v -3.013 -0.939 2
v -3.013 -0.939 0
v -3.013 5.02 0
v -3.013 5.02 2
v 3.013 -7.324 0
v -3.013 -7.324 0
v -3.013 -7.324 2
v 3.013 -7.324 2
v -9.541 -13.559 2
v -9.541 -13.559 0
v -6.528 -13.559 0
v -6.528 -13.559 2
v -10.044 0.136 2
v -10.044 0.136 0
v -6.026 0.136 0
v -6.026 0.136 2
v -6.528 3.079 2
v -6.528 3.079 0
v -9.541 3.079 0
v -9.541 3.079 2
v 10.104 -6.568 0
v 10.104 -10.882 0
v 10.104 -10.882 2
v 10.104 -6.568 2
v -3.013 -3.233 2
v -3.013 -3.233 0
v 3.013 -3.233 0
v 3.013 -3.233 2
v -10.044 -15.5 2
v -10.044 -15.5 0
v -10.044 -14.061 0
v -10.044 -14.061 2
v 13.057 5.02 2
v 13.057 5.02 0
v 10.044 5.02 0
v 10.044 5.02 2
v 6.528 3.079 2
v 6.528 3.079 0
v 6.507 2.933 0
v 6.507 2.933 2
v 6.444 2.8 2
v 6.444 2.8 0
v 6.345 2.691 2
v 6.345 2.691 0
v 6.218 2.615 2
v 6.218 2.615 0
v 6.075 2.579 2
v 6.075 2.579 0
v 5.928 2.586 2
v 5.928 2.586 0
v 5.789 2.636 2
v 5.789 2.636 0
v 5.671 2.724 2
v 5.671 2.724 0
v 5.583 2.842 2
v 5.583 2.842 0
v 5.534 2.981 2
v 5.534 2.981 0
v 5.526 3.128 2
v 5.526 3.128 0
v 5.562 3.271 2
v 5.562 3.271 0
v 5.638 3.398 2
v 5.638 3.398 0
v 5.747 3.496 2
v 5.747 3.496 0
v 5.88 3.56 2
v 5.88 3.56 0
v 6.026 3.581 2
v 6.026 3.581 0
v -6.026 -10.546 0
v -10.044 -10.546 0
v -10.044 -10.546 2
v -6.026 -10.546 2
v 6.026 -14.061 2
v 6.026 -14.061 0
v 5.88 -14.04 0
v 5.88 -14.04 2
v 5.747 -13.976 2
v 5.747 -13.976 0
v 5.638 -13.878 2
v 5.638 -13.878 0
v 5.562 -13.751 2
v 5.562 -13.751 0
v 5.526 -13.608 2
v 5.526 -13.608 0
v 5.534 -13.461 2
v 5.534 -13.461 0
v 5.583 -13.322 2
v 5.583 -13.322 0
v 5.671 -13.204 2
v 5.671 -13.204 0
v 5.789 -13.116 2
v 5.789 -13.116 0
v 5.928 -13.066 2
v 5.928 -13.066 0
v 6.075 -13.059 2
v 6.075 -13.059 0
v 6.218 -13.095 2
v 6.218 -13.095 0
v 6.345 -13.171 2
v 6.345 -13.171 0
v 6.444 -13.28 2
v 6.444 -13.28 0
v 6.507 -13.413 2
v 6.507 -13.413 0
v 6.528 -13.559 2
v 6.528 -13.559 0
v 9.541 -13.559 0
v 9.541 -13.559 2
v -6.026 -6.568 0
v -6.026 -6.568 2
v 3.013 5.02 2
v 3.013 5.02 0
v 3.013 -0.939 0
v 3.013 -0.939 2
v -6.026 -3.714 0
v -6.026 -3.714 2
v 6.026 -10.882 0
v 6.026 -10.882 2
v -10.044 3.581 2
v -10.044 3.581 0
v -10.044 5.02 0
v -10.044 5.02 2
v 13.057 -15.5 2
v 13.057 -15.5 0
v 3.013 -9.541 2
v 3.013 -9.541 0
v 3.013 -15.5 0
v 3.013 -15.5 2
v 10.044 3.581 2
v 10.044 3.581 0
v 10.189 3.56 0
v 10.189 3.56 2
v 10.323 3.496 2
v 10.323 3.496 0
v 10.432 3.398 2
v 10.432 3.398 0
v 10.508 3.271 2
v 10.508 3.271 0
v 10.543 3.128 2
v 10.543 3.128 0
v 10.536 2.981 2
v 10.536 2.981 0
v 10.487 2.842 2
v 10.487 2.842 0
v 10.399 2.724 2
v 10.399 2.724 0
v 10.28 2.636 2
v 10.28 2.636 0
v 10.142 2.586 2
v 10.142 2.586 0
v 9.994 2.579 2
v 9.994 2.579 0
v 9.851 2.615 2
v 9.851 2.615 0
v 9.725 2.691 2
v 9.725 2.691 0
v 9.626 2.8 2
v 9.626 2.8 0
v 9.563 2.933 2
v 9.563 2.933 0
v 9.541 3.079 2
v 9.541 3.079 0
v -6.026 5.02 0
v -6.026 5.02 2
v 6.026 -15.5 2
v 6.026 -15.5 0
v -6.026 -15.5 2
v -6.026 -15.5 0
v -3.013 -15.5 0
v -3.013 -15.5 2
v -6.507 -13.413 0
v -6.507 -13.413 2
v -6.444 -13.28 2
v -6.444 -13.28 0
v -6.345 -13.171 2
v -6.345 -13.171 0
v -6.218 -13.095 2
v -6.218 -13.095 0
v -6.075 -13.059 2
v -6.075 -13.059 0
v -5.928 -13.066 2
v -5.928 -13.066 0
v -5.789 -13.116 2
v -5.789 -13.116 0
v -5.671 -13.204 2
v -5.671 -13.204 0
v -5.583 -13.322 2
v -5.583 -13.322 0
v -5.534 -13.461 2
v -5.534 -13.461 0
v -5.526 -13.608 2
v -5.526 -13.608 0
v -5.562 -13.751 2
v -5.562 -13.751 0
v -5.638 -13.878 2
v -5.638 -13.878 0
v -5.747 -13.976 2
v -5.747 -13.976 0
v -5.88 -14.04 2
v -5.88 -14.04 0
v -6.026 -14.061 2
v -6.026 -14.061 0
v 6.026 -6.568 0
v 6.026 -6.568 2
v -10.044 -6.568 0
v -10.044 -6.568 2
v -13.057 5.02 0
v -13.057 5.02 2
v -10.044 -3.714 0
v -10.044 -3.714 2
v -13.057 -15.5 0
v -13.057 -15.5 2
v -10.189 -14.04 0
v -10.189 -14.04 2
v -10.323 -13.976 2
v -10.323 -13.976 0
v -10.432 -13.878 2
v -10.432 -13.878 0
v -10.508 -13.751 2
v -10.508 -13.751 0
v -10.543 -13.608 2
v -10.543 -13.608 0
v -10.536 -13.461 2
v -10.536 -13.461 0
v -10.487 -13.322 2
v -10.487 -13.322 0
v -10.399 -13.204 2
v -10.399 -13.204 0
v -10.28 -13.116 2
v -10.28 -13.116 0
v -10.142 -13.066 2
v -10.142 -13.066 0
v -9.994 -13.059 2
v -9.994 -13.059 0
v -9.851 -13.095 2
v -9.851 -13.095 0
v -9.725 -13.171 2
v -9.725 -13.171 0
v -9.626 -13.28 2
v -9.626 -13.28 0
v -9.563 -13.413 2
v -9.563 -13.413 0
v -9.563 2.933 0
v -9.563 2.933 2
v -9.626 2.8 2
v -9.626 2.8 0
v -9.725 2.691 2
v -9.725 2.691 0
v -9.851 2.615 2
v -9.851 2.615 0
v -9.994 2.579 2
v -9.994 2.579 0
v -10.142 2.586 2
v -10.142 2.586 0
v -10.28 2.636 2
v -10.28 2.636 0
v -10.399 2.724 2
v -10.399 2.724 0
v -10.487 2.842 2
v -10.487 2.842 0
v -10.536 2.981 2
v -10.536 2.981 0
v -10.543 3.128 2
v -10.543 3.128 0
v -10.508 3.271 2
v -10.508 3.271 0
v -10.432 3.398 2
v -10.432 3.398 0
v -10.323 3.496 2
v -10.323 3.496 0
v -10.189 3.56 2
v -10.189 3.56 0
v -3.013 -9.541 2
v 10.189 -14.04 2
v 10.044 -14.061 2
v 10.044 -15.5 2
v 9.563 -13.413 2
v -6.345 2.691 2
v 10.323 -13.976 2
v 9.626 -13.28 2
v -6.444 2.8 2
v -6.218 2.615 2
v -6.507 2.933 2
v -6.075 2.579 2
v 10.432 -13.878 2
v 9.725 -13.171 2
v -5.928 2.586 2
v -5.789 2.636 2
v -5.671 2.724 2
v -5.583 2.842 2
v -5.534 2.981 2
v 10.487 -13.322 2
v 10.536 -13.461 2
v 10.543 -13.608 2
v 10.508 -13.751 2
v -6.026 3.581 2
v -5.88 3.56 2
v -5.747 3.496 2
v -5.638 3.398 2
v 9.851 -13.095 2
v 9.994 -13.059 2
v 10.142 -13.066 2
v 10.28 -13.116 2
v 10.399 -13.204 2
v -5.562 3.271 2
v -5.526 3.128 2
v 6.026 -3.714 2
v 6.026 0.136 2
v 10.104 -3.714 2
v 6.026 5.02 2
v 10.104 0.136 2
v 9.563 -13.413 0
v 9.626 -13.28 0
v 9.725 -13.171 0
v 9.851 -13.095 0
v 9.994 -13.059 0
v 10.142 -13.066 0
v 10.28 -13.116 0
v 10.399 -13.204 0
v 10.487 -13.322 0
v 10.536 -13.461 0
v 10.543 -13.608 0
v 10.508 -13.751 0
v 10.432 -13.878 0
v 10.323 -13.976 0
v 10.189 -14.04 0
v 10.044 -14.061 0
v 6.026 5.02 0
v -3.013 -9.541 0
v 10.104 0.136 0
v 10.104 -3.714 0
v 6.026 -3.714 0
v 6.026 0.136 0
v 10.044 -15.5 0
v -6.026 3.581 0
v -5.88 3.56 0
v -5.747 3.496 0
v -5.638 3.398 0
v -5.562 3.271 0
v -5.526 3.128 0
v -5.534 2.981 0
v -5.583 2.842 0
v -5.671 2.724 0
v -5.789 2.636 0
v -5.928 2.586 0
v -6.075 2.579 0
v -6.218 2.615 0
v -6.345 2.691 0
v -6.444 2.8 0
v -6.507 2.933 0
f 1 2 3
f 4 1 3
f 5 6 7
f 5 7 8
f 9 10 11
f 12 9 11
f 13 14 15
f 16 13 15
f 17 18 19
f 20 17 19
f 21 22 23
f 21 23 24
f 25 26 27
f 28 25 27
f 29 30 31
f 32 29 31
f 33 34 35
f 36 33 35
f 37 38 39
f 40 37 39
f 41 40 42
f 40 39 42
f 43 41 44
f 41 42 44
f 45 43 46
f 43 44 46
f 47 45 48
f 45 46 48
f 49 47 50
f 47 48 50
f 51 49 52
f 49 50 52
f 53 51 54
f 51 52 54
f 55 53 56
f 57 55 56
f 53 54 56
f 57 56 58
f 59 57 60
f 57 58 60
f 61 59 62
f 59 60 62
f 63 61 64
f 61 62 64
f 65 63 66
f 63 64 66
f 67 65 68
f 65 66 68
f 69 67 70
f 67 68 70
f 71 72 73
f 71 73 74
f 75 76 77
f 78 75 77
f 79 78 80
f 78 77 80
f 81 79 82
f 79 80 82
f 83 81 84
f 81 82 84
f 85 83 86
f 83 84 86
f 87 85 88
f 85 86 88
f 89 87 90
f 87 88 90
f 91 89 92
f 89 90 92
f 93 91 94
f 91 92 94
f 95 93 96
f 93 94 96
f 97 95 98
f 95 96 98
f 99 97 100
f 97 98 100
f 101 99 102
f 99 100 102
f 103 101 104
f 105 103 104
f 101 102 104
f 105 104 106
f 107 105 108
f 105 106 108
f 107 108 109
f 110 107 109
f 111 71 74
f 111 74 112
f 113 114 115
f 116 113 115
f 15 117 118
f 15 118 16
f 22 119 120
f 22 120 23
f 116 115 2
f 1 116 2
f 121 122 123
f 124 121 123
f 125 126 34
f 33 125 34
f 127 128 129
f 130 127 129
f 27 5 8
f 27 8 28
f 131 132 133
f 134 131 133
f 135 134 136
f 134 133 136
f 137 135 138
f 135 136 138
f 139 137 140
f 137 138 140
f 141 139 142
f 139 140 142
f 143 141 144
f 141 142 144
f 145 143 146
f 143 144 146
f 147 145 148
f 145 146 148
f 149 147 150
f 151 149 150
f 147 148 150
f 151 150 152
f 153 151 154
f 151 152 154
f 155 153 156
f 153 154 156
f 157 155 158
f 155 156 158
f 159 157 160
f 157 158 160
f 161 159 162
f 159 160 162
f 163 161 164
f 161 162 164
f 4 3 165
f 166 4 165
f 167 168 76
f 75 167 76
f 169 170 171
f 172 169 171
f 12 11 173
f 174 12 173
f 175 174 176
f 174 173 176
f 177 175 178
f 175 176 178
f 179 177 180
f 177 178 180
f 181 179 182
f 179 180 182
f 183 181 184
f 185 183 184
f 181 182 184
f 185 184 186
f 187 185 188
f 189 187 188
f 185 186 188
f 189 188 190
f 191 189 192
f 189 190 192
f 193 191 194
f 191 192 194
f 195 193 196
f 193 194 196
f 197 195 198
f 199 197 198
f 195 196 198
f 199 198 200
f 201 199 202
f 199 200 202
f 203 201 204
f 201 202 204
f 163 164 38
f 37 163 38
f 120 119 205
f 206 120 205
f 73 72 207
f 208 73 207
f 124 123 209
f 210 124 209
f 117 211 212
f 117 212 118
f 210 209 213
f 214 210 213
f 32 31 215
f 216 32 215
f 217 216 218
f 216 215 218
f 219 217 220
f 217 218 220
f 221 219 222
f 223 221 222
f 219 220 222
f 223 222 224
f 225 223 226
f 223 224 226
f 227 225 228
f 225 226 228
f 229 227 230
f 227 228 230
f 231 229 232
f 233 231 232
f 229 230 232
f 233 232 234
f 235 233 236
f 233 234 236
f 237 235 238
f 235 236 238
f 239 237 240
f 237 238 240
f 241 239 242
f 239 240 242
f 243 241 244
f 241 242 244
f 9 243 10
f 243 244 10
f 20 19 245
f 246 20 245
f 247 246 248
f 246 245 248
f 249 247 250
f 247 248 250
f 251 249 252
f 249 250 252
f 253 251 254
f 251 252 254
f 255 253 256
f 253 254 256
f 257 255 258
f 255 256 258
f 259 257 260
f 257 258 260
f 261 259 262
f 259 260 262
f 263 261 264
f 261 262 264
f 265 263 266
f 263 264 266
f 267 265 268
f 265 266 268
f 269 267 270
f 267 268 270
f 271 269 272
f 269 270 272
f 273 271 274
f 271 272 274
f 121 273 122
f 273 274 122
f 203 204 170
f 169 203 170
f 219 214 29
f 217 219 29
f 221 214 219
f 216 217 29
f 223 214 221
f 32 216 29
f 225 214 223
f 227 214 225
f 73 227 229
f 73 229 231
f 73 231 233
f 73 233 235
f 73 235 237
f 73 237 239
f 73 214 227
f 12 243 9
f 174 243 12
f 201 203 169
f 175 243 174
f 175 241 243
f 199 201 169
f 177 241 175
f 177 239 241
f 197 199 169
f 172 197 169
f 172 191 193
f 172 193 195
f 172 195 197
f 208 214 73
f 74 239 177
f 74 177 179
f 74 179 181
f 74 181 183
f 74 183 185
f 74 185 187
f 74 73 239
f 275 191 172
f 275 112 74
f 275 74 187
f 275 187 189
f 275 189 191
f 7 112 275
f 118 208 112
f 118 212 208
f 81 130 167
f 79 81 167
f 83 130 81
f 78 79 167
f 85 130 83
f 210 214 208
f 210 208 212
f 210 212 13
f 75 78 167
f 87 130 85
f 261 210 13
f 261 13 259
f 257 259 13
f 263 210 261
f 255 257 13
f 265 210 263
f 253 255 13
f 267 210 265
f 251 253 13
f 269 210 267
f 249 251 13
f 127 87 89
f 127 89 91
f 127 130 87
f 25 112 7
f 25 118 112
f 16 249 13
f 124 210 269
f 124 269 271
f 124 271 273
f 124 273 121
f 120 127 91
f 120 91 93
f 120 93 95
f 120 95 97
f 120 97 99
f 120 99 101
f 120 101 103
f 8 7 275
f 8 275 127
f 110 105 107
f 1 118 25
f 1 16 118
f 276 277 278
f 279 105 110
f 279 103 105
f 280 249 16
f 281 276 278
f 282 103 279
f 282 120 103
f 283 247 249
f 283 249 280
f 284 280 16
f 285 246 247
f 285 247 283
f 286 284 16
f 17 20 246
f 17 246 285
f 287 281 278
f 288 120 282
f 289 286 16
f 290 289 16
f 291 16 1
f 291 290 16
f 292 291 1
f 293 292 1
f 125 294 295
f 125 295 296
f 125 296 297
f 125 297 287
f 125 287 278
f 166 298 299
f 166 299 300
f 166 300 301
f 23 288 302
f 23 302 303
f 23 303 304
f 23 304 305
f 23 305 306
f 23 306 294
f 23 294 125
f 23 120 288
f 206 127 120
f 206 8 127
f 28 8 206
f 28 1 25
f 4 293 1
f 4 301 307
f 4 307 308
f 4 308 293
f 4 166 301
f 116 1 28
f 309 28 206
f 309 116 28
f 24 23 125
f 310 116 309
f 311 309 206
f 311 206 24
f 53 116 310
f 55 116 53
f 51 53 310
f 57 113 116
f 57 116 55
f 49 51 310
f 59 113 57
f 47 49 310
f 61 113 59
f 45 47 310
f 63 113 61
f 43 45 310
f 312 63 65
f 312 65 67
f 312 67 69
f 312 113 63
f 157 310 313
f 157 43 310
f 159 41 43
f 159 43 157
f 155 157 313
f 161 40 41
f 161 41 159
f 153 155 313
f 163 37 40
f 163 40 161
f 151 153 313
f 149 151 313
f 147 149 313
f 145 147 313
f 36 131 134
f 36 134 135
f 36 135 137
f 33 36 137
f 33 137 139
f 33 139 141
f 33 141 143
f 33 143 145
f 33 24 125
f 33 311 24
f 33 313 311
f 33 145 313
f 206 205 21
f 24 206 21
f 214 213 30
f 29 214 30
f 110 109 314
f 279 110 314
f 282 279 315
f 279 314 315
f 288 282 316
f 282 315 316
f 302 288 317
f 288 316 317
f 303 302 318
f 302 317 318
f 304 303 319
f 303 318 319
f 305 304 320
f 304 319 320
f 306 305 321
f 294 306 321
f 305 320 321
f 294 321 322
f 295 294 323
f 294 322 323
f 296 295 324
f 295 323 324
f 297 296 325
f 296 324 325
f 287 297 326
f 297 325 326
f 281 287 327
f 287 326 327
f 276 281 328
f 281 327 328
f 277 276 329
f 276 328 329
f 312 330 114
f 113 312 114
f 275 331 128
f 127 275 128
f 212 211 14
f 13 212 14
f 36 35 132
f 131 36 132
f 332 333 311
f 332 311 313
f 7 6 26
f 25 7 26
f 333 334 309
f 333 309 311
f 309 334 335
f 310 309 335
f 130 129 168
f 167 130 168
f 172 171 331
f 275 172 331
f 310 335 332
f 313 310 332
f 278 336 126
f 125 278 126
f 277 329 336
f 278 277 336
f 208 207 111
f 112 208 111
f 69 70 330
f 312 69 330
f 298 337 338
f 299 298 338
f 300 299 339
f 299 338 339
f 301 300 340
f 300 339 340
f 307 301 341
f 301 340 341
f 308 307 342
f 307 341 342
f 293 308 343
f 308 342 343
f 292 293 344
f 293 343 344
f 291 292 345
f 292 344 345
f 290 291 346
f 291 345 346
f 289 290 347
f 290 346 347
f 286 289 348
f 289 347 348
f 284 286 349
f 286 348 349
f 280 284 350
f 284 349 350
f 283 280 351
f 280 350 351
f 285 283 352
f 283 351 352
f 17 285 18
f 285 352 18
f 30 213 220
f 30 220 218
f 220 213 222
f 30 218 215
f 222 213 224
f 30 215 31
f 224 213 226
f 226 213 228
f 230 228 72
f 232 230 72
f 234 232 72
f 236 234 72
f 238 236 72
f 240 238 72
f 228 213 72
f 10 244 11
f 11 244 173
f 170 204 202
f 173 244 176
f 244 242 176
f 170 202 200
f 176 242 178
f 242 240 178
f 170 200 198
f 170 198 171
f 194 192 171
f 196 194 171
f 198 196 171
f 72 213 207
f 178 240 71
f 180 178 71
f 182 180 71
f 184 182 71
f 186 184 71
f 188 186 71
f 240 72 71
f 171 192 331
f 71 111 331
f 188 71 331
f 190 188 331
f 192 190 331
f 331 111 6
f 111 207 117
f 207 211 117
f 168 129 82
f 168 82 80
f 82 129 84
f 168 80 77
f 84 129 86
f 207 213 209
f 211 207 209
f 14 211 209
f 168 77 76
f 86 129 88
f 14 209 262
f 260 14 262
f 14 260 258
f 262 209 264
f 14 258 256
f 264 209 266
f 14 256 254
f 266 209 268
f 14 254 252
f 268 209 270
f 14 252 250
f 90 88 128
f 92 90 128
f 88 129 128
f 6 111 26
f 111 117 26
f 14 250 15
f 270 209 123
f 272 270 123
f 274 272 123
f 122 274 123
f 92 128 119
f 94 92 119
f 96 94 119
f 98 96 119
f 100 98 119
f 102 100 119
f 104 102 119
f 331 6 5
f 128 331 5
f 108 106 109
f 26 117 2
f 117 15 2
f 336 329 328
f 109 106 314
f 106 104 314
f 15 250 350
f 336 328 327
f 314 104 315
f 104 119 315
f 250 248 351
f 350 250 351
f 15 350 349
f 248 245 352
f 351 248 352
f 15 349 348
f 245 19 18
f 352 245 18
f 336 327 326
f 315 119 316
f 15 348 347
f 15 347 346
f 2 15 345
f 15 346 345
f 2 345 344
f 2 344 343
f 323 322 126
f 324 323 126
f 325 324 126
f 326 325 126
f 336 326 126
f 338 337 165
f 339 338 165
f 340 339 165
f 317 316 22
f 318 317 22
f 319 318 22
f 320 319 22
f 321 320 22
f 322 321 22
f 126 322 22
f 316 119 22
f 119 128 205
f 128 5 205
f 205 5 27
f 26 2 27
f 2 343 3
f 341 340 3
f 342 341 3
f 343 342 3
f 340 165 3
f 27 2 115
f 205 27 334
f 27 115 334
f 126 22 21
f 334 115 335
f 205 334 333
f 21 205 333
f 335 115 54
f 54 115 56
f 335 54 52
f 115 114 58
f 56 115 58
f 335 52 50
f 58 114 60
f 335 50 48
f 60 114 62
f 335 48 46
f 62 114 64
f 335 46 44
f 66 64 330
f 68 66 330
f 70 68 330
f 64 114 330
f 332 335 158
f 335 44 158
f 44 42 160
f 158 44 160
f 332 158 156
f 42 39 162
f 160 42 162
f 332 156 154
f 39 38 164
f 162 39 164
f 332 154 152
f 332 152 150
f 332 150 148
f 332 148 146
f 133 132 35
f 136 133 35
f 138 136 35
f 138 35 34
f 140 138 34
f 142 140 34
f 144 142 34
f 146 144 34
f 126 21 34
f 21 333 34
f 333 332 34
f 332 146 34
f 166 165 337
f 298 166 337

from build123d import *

# Parameters (mm, degrees)
SKETCH_1_W      = 4.017465015
SKETCH_1_H      = 3.978187255
SKETCH_1_W_2    = 4.077802358
SKETCH_1_H_2    = 4.314220686
SKETCH_1_H_3    = 3.850544283
SKETCH_1_W_3    = 6.026196403
SKETCH_1_H_4    = 4.091203301
EXTRUDE_1_DEPTH = 2


with BuildPart() as part:
    # 草图1 → 凸台-拉伸1 (new body)
    with BuildSketch(Plane.XY):
        with BuildLine():
            Line((-3.013099113, 5.02), (-6.026197287, 5.02))
            Line((-6.026197287, 5.02), (-6.026197287, 3.58112561))
            ThreePointArc((-6.026197287, 3.58112561), (-5.671102411, 2.723845564), (-6.528380473, 3.07894523))
            Line((-6.528380473, 3.07894523), (-9.541479116, 3.07894523))
            ThreePointArc((-9.541479116, 3.07894523), (-10.398757348, 2.723845394), (-10.043662302, 3.58112561))
            Line((-10.043662302, 3.58112561), (-10.043662302, 5.02))
            Line((-10.043662302, 5.02), (-13.056760945, 5.02))
            Line((-13.056760945, 5.02), (-13.056760945, -15.5))
            Line((-13.056760945, -15.5), (-10.043662302, -15.5))
            Line((-10.043662302, -15.5), (-10.043662302, -14.061127012))
            ThreePointArc((-10.043662302, -14.061127012), (-10.398759363, -13.203846763), (-9.541479117, -13.558943832))
            Line((-9.541479117, -13.558943832), (-6.528380473, -13.558943832))
            ThreePointArc((-6.528380473, -13.558943832), (-5.67110042, -13.203846836), (-6.026197287, -14.061126942))
            Line((-6.026197287, -14.061126942), (-6.026197287, -15.5))
            Line((-6.026197287, -15.5), (-3.013099112, -15.5))
            Line((-3.013099112, -15.5), (-3.013099112, -9.541477971))
            Line((-3.013099112, -9.541477971), (3.013099113, -9.541477971))
            Line((3.013099113, -9.541477971), (3.013099113, -15.5))
            Line((3.013099113, -15.5), (6.02619635, -15.5))
            Line((6.02619635, -15.5), (6.02619635, -14.061126942))
            ThreePointArc((6.02619635, -14.061126942), (5.671100318, -13.20384612), (6.528380473, -13.558943762))
            Line((6.528380473, -13.558943762), (9.541479585, -13.558943762))
            ThreePointArc((9.541479585, -13.558943762), (10.398760105, -13.203847022), (10.043661834, -14.061126908))
            Line((10.043661834, -14.061126908), (10.043661834, -15.5))
            Line((10.043661834, -15.5), (13.056760946, -15.5))
            Line((13.056760946, -15.5), (13.056760946, 5.02))
            Line((13.056760946, 5.02), (10.043661833, 5.02))
            Line((10.043661833, 5.02), (10.043661833, 3.58112561))
            ThreePointArc((10.043661833, 3.58112561), (10.398758101, 2.723845772), (9.541479585, 3.07894523))
            Line((9.541479585, 3.07894523), (6.528380474, 3.07894523))
            ThreePointArc((6.528380474, 3.07894523), (5.671102333, 2.723844823), (6.026196353, 3.58112561))
            Line((6.026196353, 3.58112561), (6.026196353, 5.02))
            Line((6.026196353, 5.02), (3.013099113, 5.02))
            Line((3.013099113, 5.02), (3.013099113, -0.938521958))
            Line((3.013099113, -0.938521958), (-3.013099113, -0.938521958))
            Line((-3.013099113, -0.938521958), (-3.013099113, 5.02))
        make_face()
        with Locations((-8.034929795, -8.556751552)):
            Rectangle(SKETCH_1_W, SKETCH_1_H, mode=Mode.SUBTRACT)
        with Locations((8.06509753, -8.724768268)):
            Rectangle(SKETCH_1_W_2, SKETCH_1_H_2, mode=Mode.SUBTRACT)
        with Locations((8.06509753, -1.788857431)):
            Rectangle(SKETCH_1_W_2, SKETCH_1_H_3, mode=Mode.SUBTRACT)
        with Locations((-4.68e-07, -5.278413187)):
            Rectangle(SKETCH_1_W_3, SKETCH_1_H_4, mode=Mode.SUBTRACT)
        with Locations((-8.034929795, -1.788857431)):
            Rectangle(SKETCH_1_W, SKETCH_1_H_3, mode=Mode.SUBTRACT)
    extrude(amount=EXTRUDE_1_DEPTH)


solid = part.part
